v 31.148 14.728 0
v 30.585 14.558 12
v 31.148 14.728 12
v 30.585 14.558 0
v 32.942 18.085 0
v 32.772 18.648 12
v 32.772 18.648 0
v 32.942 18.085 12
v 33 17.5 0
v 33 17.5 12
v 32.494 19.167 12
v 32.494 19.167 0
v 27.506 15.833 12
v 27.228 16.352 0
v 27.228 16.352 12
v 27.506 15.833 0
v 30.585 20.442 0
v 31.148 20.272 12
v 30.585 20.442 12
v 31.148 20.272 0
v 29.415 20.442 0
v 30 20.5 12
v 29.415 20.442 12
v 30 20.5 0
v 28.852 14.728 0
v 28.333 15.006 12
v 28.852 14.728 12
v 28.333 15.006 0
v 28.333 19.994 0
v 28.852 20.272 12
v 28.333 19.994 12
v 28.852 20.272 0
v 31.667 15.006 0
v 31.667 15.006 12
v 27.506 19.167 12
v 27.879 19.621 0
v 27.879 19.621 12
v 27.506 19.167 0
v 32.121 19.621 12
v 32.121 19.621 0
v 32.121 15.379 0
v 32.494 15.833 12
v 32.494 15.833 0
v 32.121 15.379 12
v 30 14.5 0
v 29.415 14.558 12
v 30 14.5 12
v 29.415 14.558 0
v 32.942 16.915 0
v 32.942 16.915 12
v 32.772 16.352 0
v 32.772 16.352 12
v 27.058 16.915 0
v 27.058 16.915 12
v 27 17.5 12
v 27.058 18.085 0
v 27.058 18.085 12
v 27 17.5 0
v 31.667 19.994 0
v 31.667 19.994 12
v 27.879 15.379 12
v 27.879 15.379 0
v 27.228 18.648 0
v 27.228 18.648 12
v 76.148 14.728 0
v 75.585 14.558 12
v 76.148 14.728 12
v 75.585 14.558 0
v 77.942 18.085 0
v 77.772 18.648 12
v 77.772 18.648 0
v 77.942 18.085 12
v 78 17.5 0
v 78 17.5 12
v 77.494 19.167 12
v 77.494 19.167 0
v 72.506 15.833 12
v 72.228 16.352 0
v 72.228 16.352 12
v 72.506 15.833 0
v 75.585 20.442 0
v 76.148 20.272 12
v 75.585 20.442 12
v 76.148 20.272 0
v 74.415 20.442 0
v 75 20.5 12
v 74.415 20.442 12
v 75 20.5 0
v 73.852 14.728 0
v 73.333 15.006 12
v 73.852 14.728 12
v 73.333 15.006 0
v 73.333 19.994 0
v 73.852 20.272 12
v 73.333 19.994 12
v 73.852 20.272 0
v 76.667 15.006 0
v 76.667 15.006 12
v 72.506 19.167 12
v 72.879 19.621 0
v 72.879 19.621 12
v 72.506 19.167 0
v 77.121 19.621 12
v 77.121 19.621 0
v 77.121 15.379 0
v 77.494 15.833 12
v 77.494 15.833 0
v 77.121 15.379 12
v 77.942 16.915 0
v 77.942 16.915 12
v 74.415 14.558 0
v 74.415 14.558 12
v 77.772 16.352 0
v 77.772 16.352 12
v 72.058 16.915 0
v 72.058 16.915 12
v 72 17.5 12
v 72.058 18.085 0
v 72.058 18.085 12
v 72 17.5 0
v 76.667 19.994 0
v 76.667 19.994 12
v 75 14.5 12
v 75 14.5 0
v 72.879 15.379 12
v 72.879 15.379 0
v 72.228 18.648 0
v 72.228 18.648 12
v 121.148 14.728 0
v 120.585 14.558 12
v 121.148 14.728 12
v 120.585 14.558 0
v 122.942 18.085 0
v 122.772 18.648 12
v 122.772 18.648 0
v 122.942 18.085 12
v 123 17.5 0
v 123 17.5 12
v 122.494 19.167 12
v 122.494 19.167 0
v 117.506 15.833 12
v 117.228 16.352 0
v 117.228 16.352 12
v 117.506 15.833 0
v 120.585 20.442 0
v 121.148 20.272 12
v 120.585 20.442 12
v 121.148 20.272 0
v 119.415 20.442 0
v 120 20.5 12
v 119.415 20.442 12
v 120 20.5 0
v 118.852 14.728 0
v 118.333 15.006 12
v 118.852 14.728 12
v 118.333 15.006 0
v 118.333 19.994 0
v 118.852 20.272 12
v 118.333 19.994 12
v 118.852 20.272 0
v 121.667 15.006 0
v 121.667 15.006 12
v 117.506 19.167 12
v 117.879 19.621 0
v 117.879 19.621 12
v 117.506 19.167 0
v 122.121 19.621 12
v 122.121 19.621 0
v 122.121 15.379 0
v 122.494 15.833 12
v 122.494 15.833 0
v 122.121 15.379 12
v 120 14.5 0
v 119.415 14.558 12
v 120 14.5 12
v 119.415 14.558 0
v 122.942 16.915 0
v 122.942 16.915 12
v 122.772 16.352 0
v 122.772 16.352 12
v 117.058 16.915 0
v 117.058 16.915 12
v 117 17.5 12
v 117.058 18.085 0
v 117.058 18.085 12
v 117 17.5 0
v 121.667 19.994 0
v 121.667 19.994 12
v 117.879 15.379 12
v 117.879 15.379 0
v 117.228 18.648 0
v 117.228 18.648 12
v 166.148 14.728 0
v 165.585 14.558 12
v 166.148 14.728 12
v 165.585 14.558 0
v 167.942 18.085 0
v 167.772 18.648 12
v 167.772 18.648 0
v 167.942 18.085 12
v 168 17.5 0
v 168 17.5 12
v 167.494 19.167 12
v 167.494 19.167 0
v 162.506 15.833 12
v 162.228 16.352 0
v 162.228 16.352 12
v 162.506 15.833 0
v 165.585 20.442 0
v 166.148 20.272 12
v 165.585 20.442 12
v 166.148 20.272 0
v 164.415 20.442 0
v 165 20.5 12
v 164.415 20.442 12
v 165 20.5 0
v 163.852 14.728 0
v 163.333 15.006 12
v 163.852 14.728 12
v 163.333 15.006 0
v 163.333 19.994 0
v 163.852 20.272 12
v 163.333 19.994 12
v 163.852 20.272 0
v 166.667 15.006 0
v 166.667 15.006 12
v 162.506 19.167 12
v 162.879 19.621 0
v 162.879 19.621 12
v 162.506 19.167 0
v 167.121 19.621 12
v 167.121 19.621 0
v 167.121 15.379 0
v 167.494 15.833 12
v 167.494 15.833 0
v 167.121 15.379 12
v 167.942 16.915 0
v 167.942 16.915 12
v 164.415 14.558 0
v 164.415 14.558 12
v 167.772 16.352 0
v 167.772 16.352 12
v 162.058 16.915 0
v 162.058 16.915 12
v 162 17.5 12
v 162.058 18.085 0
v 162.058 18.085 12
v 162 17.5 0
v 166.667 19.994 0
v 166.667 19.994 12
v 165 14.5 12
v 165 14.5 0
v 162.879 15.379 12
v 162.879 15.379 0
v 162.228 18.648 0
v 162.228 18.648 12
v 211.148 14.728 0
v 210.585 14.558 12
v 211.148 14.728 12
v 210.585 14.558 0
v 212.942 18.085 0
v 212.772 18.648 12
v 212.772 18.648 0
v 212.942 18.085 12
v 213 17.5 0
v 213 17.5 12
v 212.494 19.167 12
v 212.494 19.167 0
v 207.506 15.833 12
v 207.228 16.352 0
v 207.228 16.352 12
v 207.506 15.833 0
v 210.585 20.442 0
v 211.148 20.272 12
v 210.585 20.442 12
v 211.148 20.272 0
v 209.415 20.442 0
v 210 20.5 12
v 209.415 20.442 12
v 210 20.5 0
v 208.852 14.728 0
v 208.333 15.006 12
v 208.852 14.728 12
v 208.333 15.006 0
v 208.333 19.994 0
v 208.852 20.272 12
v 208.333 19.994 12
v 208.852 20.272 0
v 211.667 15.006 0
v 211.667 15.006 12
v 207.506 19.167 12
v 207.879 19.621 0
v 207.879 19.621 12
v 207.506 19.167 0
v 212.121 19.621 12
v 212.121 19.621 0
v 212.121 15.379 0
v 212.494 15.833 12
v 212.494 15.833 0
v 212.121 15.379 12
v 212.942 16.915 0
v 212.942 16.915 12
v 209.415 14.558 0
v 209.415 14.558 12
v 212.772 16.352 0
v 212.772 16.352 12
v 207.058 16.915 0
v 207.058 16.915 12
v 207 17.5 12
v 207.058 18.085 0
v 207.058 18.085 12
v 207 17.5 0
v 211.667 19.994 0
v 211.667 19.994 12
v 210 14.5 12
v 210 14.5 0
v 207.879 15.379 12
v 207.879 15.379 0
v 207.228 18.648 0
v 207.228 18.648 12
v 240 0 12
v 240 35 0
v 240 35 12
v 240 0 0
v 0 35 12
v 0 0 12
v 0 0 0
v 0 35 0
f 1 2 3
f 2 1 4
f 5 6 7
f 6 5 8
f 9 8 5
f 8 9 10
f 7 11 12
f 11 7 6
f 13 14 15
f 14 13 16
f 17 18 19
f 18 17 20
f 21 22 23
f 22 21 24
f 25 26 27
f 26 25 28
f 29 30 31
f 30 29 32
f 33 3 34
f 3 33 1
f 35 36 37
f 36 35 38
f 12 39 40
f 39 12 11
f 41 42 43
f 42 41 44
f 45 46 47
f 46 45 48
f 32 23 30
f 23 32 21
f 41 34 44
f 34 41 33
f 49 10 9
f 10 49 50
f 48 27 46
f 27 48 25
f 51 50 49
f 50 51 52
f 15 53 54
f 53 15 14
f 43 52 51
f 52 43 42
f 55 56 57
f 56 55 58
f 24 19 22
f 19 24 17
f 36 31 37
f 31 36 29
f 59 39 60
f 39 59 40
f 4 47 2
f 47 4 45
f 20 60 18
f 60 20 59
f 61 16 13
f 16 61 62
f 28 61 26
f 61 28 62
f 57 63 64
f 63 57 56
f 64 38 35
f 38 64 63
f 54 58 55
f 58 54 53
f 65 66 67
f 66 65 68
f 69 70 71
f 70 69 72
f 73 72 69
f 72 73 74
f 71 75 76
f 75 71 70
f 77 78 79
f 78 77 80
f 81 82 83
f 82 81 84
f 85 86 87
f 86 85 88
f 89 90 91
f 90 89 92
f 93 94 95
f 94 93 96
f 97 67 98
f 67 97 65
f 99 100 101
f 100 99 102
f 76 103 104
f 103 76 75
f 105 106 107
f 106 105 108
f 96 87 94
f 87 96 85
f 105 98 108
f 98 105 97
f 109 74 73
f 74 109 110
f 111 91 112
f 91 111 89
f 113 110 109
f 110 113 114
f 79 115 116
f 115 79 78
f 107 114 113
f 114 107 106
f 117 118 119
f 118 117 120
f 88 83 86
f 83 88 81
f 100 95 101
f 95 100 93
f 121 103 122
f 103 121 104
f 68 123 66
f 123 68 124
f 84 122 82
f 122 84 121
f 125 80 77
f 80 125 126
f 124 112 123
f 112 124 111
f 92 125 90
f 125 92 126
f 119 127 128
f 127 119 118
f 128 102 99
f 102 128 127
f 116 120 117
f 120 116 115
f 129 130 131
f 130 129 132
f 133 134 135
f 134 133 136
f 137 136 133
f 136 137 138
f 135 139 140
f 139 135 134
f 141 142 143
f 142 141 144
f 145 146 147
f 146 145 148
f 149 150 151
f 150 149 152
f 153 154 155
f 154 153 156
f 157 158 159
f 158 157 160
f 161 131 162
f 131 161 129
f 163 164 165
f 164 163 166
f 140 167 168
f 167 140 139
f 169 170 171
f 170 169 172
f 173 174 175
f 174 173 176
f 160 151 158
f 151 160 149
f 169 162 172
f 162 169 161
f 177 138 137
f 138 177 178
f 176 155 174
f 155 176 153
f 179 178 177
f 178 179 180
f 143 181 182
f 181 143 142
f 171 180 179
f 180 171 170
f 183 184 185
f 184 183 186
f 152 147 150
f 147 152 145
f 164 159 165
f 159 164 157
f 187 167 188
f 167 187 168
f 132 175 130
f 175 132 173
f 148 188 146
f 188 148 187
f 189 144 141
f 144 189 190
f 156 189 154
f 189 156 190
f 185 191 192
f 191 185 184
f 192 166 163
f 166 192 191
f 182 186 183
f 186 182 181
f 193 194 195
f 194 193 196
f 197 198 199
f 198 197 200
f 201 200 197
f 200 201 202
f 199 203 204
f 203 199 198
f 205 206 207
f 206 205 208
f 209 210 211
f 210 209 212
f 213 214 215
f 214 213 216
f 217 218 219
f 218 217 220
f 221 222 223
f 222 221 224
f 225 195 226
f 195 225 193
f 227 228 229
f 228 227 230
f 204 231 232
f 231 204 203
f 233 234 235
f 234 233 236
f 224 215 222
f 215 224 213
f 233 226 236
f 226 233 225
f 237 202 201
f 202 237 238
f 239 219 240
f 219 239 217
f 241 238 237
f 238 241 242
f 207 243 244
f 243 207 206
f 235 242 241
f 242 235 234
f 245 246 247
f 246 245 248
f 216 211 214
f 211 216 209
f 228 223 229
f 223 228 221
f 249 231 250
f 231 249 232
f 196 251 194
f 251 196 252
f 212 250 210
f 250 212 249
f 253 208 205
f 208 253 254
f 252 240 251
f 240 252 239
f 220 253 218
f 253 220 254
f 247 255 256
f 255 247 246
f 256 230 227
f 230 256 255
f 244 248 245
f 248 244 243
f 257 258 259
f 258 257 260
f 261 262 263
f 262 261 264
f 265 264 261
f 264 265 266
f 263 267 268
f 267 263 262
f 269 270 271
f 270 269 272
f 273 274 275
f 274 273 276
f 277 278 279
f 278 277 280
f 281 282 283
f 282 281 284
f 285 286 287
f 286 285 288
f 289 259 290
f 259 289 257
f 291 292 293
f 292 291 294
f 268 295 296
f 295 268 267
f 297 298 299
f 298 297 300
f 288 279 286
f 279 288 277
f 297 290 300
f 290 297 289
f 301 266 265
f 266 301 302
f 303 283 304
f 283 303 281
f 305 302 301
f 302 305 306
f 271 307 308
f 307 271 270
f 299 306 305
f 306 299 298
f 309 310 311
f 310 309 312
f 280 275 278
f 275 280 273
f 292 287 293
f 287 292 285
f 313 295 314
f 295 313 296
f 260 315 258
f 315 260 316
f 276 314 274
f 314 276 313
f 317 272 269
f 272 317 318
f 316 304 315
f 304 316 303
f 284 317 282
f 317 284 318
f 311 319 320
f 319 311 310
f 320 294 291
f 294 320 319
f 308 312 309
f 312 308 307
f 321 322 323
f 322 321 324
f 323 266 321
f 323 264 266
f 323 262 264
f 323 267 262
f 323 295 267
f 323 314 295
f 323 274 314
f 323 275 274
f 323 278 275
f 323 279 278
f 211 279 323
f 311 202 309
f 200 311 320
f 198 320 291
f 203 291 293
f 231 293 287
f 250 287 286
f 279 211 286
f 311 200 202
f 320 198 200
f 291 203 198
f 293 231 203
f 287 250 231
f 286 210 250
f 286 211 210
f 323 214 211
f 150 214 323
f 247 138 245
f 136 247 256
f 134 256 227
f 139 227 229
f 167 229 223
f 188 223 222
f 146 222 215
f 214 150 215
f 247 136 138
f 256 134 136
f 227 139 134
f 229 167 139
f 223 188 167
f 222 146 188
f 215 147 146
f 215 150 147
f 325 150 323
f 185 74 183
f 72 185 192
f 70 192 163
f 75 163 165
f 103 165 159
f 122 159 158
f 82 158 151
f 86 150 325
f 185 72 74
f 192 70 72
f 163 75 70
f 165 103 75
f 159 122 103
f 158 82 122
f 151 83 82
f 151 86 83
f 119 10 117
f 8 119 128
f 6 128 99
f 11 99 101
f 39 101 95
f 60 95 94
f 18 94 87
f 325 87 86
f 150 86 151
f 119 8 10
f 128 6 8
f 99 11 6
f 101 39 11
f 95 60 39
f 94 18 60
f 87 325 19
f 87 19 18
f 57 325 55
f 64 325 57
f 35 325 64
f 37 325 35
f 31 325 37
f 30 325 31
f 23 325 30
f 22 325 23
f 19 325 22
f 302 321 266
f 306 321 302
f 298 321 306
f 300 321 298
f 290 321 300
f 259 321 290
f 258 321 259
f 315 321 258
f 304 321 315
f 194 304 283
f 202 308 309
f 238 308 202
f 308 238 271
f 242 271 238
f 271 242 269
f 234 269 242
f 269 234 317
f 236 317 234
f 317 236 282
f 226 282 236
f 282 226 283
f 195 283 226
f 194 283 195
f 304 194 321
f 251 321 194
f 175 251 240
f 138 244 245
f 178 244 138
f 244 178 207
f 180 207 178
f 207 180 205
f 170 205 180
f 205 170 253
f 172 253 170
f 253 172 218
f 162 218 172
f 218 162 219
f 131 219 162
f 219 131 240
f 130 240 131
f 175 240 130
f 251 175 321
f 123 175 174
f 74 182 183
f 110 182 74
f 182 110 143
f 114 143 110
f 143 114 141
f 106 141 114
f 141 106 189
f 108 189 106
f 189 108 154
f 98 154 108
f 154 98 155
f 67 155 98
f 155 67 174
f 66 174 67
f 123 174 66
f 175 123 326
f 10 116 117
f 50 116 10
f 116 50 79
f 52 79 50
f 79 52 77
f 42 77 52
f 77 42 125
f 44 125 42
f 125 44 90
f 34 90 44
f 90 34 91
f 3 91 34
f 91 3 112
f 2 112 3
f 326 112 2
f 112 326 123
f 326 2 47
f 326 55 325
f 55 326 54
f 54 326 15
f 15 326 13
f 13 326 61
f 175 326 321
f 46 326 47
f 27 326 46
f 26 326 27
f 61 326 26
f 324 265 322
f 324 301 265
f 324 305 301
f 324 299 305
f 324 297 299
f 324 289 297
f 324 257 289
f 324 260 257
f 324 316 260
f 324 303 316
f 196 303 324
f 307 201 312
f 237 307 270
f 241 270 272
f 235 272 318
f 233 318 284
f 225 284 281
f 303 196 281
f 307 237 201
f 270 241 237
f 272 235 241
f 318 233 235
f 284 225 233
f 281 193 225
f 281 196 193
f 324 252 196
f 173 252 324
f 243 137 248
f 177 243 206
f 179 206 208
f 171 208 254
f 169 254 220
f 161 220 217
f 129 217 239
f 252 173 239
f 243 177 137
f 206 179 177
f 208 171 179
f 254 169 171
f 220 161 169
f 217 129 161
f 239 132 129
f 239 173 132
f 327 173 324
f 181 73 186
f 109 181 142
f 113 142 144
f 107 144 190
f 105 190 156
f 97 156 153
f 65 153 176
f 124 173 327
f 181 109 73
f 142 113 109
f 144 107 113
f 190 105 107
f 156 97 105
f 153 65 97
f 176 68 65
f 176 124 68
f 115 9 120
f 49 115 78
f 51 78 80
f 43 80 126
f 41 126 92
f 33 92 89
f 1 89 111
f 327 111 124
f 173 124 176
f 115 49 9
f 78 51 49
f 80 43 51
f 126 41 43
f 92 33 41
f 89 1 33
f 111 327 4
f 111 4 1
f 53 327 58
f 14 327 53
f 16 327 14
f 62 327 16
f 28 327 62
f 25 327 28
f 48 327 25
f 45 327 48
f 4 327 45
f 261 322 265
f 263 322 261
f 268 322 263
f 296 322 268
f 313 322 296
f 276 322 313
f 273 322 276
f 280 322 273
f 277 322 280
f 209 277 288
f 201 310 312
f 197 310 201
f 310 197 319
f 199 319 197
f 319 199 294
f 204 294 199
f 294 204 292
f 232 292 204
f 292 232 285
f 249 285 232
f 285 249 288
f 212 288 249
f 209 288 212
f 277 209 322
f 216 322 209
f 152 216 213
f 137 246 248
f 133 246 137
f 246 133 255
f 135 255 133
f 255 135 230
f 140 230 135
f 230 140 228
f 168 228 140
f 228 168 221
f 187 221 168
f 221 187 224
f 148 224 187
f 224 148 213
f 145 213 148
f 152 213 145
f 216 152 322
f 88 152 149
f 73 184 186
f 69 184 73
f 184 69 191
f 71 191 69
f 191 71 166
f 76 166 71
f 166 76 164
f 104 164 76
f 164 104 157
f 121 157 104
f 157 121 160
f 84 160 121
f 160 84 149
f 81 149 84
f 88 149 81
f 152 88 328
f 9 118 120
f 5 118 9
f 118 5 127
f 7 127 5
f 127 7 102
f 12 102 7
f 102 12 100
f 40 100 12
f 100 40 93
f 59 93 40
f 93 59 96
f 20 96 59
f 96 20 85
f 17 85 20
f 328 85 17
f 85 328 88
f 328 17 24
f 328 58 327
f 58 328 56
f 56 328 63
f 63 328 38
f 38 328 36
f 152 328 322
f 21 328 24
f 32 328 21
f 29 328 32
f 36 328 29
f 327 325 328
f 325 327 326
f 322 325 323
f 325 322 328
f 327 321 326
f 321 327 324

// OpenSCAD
$fn = 32;

// ----------------------------------------------------------------------
// Long rail: 200-250 mm mounting rail
// ----------------------------------------------------------------------

// --- parameters (mm) ---
rail_l = 240;             // rail length, X
rail_w = 35;              // rail width, Y
rail_t = 12;              // rail thickness, Z
hole_d = 6;               // mounting hole diameter
hole_start = 30;          // first hole offset from the end
hole_pitch = 45;          // hole pitch
holes = 5;                // number of holes

difference() {
  cube([rail_l, rail_w, rail_t]);
  for (i = [0 : holes - 1])
    translate([hole_start + i * hole_pitch, rail_w / 2, -1])
      cylinder(h = rail_t + 2, d = hole_d);
}
